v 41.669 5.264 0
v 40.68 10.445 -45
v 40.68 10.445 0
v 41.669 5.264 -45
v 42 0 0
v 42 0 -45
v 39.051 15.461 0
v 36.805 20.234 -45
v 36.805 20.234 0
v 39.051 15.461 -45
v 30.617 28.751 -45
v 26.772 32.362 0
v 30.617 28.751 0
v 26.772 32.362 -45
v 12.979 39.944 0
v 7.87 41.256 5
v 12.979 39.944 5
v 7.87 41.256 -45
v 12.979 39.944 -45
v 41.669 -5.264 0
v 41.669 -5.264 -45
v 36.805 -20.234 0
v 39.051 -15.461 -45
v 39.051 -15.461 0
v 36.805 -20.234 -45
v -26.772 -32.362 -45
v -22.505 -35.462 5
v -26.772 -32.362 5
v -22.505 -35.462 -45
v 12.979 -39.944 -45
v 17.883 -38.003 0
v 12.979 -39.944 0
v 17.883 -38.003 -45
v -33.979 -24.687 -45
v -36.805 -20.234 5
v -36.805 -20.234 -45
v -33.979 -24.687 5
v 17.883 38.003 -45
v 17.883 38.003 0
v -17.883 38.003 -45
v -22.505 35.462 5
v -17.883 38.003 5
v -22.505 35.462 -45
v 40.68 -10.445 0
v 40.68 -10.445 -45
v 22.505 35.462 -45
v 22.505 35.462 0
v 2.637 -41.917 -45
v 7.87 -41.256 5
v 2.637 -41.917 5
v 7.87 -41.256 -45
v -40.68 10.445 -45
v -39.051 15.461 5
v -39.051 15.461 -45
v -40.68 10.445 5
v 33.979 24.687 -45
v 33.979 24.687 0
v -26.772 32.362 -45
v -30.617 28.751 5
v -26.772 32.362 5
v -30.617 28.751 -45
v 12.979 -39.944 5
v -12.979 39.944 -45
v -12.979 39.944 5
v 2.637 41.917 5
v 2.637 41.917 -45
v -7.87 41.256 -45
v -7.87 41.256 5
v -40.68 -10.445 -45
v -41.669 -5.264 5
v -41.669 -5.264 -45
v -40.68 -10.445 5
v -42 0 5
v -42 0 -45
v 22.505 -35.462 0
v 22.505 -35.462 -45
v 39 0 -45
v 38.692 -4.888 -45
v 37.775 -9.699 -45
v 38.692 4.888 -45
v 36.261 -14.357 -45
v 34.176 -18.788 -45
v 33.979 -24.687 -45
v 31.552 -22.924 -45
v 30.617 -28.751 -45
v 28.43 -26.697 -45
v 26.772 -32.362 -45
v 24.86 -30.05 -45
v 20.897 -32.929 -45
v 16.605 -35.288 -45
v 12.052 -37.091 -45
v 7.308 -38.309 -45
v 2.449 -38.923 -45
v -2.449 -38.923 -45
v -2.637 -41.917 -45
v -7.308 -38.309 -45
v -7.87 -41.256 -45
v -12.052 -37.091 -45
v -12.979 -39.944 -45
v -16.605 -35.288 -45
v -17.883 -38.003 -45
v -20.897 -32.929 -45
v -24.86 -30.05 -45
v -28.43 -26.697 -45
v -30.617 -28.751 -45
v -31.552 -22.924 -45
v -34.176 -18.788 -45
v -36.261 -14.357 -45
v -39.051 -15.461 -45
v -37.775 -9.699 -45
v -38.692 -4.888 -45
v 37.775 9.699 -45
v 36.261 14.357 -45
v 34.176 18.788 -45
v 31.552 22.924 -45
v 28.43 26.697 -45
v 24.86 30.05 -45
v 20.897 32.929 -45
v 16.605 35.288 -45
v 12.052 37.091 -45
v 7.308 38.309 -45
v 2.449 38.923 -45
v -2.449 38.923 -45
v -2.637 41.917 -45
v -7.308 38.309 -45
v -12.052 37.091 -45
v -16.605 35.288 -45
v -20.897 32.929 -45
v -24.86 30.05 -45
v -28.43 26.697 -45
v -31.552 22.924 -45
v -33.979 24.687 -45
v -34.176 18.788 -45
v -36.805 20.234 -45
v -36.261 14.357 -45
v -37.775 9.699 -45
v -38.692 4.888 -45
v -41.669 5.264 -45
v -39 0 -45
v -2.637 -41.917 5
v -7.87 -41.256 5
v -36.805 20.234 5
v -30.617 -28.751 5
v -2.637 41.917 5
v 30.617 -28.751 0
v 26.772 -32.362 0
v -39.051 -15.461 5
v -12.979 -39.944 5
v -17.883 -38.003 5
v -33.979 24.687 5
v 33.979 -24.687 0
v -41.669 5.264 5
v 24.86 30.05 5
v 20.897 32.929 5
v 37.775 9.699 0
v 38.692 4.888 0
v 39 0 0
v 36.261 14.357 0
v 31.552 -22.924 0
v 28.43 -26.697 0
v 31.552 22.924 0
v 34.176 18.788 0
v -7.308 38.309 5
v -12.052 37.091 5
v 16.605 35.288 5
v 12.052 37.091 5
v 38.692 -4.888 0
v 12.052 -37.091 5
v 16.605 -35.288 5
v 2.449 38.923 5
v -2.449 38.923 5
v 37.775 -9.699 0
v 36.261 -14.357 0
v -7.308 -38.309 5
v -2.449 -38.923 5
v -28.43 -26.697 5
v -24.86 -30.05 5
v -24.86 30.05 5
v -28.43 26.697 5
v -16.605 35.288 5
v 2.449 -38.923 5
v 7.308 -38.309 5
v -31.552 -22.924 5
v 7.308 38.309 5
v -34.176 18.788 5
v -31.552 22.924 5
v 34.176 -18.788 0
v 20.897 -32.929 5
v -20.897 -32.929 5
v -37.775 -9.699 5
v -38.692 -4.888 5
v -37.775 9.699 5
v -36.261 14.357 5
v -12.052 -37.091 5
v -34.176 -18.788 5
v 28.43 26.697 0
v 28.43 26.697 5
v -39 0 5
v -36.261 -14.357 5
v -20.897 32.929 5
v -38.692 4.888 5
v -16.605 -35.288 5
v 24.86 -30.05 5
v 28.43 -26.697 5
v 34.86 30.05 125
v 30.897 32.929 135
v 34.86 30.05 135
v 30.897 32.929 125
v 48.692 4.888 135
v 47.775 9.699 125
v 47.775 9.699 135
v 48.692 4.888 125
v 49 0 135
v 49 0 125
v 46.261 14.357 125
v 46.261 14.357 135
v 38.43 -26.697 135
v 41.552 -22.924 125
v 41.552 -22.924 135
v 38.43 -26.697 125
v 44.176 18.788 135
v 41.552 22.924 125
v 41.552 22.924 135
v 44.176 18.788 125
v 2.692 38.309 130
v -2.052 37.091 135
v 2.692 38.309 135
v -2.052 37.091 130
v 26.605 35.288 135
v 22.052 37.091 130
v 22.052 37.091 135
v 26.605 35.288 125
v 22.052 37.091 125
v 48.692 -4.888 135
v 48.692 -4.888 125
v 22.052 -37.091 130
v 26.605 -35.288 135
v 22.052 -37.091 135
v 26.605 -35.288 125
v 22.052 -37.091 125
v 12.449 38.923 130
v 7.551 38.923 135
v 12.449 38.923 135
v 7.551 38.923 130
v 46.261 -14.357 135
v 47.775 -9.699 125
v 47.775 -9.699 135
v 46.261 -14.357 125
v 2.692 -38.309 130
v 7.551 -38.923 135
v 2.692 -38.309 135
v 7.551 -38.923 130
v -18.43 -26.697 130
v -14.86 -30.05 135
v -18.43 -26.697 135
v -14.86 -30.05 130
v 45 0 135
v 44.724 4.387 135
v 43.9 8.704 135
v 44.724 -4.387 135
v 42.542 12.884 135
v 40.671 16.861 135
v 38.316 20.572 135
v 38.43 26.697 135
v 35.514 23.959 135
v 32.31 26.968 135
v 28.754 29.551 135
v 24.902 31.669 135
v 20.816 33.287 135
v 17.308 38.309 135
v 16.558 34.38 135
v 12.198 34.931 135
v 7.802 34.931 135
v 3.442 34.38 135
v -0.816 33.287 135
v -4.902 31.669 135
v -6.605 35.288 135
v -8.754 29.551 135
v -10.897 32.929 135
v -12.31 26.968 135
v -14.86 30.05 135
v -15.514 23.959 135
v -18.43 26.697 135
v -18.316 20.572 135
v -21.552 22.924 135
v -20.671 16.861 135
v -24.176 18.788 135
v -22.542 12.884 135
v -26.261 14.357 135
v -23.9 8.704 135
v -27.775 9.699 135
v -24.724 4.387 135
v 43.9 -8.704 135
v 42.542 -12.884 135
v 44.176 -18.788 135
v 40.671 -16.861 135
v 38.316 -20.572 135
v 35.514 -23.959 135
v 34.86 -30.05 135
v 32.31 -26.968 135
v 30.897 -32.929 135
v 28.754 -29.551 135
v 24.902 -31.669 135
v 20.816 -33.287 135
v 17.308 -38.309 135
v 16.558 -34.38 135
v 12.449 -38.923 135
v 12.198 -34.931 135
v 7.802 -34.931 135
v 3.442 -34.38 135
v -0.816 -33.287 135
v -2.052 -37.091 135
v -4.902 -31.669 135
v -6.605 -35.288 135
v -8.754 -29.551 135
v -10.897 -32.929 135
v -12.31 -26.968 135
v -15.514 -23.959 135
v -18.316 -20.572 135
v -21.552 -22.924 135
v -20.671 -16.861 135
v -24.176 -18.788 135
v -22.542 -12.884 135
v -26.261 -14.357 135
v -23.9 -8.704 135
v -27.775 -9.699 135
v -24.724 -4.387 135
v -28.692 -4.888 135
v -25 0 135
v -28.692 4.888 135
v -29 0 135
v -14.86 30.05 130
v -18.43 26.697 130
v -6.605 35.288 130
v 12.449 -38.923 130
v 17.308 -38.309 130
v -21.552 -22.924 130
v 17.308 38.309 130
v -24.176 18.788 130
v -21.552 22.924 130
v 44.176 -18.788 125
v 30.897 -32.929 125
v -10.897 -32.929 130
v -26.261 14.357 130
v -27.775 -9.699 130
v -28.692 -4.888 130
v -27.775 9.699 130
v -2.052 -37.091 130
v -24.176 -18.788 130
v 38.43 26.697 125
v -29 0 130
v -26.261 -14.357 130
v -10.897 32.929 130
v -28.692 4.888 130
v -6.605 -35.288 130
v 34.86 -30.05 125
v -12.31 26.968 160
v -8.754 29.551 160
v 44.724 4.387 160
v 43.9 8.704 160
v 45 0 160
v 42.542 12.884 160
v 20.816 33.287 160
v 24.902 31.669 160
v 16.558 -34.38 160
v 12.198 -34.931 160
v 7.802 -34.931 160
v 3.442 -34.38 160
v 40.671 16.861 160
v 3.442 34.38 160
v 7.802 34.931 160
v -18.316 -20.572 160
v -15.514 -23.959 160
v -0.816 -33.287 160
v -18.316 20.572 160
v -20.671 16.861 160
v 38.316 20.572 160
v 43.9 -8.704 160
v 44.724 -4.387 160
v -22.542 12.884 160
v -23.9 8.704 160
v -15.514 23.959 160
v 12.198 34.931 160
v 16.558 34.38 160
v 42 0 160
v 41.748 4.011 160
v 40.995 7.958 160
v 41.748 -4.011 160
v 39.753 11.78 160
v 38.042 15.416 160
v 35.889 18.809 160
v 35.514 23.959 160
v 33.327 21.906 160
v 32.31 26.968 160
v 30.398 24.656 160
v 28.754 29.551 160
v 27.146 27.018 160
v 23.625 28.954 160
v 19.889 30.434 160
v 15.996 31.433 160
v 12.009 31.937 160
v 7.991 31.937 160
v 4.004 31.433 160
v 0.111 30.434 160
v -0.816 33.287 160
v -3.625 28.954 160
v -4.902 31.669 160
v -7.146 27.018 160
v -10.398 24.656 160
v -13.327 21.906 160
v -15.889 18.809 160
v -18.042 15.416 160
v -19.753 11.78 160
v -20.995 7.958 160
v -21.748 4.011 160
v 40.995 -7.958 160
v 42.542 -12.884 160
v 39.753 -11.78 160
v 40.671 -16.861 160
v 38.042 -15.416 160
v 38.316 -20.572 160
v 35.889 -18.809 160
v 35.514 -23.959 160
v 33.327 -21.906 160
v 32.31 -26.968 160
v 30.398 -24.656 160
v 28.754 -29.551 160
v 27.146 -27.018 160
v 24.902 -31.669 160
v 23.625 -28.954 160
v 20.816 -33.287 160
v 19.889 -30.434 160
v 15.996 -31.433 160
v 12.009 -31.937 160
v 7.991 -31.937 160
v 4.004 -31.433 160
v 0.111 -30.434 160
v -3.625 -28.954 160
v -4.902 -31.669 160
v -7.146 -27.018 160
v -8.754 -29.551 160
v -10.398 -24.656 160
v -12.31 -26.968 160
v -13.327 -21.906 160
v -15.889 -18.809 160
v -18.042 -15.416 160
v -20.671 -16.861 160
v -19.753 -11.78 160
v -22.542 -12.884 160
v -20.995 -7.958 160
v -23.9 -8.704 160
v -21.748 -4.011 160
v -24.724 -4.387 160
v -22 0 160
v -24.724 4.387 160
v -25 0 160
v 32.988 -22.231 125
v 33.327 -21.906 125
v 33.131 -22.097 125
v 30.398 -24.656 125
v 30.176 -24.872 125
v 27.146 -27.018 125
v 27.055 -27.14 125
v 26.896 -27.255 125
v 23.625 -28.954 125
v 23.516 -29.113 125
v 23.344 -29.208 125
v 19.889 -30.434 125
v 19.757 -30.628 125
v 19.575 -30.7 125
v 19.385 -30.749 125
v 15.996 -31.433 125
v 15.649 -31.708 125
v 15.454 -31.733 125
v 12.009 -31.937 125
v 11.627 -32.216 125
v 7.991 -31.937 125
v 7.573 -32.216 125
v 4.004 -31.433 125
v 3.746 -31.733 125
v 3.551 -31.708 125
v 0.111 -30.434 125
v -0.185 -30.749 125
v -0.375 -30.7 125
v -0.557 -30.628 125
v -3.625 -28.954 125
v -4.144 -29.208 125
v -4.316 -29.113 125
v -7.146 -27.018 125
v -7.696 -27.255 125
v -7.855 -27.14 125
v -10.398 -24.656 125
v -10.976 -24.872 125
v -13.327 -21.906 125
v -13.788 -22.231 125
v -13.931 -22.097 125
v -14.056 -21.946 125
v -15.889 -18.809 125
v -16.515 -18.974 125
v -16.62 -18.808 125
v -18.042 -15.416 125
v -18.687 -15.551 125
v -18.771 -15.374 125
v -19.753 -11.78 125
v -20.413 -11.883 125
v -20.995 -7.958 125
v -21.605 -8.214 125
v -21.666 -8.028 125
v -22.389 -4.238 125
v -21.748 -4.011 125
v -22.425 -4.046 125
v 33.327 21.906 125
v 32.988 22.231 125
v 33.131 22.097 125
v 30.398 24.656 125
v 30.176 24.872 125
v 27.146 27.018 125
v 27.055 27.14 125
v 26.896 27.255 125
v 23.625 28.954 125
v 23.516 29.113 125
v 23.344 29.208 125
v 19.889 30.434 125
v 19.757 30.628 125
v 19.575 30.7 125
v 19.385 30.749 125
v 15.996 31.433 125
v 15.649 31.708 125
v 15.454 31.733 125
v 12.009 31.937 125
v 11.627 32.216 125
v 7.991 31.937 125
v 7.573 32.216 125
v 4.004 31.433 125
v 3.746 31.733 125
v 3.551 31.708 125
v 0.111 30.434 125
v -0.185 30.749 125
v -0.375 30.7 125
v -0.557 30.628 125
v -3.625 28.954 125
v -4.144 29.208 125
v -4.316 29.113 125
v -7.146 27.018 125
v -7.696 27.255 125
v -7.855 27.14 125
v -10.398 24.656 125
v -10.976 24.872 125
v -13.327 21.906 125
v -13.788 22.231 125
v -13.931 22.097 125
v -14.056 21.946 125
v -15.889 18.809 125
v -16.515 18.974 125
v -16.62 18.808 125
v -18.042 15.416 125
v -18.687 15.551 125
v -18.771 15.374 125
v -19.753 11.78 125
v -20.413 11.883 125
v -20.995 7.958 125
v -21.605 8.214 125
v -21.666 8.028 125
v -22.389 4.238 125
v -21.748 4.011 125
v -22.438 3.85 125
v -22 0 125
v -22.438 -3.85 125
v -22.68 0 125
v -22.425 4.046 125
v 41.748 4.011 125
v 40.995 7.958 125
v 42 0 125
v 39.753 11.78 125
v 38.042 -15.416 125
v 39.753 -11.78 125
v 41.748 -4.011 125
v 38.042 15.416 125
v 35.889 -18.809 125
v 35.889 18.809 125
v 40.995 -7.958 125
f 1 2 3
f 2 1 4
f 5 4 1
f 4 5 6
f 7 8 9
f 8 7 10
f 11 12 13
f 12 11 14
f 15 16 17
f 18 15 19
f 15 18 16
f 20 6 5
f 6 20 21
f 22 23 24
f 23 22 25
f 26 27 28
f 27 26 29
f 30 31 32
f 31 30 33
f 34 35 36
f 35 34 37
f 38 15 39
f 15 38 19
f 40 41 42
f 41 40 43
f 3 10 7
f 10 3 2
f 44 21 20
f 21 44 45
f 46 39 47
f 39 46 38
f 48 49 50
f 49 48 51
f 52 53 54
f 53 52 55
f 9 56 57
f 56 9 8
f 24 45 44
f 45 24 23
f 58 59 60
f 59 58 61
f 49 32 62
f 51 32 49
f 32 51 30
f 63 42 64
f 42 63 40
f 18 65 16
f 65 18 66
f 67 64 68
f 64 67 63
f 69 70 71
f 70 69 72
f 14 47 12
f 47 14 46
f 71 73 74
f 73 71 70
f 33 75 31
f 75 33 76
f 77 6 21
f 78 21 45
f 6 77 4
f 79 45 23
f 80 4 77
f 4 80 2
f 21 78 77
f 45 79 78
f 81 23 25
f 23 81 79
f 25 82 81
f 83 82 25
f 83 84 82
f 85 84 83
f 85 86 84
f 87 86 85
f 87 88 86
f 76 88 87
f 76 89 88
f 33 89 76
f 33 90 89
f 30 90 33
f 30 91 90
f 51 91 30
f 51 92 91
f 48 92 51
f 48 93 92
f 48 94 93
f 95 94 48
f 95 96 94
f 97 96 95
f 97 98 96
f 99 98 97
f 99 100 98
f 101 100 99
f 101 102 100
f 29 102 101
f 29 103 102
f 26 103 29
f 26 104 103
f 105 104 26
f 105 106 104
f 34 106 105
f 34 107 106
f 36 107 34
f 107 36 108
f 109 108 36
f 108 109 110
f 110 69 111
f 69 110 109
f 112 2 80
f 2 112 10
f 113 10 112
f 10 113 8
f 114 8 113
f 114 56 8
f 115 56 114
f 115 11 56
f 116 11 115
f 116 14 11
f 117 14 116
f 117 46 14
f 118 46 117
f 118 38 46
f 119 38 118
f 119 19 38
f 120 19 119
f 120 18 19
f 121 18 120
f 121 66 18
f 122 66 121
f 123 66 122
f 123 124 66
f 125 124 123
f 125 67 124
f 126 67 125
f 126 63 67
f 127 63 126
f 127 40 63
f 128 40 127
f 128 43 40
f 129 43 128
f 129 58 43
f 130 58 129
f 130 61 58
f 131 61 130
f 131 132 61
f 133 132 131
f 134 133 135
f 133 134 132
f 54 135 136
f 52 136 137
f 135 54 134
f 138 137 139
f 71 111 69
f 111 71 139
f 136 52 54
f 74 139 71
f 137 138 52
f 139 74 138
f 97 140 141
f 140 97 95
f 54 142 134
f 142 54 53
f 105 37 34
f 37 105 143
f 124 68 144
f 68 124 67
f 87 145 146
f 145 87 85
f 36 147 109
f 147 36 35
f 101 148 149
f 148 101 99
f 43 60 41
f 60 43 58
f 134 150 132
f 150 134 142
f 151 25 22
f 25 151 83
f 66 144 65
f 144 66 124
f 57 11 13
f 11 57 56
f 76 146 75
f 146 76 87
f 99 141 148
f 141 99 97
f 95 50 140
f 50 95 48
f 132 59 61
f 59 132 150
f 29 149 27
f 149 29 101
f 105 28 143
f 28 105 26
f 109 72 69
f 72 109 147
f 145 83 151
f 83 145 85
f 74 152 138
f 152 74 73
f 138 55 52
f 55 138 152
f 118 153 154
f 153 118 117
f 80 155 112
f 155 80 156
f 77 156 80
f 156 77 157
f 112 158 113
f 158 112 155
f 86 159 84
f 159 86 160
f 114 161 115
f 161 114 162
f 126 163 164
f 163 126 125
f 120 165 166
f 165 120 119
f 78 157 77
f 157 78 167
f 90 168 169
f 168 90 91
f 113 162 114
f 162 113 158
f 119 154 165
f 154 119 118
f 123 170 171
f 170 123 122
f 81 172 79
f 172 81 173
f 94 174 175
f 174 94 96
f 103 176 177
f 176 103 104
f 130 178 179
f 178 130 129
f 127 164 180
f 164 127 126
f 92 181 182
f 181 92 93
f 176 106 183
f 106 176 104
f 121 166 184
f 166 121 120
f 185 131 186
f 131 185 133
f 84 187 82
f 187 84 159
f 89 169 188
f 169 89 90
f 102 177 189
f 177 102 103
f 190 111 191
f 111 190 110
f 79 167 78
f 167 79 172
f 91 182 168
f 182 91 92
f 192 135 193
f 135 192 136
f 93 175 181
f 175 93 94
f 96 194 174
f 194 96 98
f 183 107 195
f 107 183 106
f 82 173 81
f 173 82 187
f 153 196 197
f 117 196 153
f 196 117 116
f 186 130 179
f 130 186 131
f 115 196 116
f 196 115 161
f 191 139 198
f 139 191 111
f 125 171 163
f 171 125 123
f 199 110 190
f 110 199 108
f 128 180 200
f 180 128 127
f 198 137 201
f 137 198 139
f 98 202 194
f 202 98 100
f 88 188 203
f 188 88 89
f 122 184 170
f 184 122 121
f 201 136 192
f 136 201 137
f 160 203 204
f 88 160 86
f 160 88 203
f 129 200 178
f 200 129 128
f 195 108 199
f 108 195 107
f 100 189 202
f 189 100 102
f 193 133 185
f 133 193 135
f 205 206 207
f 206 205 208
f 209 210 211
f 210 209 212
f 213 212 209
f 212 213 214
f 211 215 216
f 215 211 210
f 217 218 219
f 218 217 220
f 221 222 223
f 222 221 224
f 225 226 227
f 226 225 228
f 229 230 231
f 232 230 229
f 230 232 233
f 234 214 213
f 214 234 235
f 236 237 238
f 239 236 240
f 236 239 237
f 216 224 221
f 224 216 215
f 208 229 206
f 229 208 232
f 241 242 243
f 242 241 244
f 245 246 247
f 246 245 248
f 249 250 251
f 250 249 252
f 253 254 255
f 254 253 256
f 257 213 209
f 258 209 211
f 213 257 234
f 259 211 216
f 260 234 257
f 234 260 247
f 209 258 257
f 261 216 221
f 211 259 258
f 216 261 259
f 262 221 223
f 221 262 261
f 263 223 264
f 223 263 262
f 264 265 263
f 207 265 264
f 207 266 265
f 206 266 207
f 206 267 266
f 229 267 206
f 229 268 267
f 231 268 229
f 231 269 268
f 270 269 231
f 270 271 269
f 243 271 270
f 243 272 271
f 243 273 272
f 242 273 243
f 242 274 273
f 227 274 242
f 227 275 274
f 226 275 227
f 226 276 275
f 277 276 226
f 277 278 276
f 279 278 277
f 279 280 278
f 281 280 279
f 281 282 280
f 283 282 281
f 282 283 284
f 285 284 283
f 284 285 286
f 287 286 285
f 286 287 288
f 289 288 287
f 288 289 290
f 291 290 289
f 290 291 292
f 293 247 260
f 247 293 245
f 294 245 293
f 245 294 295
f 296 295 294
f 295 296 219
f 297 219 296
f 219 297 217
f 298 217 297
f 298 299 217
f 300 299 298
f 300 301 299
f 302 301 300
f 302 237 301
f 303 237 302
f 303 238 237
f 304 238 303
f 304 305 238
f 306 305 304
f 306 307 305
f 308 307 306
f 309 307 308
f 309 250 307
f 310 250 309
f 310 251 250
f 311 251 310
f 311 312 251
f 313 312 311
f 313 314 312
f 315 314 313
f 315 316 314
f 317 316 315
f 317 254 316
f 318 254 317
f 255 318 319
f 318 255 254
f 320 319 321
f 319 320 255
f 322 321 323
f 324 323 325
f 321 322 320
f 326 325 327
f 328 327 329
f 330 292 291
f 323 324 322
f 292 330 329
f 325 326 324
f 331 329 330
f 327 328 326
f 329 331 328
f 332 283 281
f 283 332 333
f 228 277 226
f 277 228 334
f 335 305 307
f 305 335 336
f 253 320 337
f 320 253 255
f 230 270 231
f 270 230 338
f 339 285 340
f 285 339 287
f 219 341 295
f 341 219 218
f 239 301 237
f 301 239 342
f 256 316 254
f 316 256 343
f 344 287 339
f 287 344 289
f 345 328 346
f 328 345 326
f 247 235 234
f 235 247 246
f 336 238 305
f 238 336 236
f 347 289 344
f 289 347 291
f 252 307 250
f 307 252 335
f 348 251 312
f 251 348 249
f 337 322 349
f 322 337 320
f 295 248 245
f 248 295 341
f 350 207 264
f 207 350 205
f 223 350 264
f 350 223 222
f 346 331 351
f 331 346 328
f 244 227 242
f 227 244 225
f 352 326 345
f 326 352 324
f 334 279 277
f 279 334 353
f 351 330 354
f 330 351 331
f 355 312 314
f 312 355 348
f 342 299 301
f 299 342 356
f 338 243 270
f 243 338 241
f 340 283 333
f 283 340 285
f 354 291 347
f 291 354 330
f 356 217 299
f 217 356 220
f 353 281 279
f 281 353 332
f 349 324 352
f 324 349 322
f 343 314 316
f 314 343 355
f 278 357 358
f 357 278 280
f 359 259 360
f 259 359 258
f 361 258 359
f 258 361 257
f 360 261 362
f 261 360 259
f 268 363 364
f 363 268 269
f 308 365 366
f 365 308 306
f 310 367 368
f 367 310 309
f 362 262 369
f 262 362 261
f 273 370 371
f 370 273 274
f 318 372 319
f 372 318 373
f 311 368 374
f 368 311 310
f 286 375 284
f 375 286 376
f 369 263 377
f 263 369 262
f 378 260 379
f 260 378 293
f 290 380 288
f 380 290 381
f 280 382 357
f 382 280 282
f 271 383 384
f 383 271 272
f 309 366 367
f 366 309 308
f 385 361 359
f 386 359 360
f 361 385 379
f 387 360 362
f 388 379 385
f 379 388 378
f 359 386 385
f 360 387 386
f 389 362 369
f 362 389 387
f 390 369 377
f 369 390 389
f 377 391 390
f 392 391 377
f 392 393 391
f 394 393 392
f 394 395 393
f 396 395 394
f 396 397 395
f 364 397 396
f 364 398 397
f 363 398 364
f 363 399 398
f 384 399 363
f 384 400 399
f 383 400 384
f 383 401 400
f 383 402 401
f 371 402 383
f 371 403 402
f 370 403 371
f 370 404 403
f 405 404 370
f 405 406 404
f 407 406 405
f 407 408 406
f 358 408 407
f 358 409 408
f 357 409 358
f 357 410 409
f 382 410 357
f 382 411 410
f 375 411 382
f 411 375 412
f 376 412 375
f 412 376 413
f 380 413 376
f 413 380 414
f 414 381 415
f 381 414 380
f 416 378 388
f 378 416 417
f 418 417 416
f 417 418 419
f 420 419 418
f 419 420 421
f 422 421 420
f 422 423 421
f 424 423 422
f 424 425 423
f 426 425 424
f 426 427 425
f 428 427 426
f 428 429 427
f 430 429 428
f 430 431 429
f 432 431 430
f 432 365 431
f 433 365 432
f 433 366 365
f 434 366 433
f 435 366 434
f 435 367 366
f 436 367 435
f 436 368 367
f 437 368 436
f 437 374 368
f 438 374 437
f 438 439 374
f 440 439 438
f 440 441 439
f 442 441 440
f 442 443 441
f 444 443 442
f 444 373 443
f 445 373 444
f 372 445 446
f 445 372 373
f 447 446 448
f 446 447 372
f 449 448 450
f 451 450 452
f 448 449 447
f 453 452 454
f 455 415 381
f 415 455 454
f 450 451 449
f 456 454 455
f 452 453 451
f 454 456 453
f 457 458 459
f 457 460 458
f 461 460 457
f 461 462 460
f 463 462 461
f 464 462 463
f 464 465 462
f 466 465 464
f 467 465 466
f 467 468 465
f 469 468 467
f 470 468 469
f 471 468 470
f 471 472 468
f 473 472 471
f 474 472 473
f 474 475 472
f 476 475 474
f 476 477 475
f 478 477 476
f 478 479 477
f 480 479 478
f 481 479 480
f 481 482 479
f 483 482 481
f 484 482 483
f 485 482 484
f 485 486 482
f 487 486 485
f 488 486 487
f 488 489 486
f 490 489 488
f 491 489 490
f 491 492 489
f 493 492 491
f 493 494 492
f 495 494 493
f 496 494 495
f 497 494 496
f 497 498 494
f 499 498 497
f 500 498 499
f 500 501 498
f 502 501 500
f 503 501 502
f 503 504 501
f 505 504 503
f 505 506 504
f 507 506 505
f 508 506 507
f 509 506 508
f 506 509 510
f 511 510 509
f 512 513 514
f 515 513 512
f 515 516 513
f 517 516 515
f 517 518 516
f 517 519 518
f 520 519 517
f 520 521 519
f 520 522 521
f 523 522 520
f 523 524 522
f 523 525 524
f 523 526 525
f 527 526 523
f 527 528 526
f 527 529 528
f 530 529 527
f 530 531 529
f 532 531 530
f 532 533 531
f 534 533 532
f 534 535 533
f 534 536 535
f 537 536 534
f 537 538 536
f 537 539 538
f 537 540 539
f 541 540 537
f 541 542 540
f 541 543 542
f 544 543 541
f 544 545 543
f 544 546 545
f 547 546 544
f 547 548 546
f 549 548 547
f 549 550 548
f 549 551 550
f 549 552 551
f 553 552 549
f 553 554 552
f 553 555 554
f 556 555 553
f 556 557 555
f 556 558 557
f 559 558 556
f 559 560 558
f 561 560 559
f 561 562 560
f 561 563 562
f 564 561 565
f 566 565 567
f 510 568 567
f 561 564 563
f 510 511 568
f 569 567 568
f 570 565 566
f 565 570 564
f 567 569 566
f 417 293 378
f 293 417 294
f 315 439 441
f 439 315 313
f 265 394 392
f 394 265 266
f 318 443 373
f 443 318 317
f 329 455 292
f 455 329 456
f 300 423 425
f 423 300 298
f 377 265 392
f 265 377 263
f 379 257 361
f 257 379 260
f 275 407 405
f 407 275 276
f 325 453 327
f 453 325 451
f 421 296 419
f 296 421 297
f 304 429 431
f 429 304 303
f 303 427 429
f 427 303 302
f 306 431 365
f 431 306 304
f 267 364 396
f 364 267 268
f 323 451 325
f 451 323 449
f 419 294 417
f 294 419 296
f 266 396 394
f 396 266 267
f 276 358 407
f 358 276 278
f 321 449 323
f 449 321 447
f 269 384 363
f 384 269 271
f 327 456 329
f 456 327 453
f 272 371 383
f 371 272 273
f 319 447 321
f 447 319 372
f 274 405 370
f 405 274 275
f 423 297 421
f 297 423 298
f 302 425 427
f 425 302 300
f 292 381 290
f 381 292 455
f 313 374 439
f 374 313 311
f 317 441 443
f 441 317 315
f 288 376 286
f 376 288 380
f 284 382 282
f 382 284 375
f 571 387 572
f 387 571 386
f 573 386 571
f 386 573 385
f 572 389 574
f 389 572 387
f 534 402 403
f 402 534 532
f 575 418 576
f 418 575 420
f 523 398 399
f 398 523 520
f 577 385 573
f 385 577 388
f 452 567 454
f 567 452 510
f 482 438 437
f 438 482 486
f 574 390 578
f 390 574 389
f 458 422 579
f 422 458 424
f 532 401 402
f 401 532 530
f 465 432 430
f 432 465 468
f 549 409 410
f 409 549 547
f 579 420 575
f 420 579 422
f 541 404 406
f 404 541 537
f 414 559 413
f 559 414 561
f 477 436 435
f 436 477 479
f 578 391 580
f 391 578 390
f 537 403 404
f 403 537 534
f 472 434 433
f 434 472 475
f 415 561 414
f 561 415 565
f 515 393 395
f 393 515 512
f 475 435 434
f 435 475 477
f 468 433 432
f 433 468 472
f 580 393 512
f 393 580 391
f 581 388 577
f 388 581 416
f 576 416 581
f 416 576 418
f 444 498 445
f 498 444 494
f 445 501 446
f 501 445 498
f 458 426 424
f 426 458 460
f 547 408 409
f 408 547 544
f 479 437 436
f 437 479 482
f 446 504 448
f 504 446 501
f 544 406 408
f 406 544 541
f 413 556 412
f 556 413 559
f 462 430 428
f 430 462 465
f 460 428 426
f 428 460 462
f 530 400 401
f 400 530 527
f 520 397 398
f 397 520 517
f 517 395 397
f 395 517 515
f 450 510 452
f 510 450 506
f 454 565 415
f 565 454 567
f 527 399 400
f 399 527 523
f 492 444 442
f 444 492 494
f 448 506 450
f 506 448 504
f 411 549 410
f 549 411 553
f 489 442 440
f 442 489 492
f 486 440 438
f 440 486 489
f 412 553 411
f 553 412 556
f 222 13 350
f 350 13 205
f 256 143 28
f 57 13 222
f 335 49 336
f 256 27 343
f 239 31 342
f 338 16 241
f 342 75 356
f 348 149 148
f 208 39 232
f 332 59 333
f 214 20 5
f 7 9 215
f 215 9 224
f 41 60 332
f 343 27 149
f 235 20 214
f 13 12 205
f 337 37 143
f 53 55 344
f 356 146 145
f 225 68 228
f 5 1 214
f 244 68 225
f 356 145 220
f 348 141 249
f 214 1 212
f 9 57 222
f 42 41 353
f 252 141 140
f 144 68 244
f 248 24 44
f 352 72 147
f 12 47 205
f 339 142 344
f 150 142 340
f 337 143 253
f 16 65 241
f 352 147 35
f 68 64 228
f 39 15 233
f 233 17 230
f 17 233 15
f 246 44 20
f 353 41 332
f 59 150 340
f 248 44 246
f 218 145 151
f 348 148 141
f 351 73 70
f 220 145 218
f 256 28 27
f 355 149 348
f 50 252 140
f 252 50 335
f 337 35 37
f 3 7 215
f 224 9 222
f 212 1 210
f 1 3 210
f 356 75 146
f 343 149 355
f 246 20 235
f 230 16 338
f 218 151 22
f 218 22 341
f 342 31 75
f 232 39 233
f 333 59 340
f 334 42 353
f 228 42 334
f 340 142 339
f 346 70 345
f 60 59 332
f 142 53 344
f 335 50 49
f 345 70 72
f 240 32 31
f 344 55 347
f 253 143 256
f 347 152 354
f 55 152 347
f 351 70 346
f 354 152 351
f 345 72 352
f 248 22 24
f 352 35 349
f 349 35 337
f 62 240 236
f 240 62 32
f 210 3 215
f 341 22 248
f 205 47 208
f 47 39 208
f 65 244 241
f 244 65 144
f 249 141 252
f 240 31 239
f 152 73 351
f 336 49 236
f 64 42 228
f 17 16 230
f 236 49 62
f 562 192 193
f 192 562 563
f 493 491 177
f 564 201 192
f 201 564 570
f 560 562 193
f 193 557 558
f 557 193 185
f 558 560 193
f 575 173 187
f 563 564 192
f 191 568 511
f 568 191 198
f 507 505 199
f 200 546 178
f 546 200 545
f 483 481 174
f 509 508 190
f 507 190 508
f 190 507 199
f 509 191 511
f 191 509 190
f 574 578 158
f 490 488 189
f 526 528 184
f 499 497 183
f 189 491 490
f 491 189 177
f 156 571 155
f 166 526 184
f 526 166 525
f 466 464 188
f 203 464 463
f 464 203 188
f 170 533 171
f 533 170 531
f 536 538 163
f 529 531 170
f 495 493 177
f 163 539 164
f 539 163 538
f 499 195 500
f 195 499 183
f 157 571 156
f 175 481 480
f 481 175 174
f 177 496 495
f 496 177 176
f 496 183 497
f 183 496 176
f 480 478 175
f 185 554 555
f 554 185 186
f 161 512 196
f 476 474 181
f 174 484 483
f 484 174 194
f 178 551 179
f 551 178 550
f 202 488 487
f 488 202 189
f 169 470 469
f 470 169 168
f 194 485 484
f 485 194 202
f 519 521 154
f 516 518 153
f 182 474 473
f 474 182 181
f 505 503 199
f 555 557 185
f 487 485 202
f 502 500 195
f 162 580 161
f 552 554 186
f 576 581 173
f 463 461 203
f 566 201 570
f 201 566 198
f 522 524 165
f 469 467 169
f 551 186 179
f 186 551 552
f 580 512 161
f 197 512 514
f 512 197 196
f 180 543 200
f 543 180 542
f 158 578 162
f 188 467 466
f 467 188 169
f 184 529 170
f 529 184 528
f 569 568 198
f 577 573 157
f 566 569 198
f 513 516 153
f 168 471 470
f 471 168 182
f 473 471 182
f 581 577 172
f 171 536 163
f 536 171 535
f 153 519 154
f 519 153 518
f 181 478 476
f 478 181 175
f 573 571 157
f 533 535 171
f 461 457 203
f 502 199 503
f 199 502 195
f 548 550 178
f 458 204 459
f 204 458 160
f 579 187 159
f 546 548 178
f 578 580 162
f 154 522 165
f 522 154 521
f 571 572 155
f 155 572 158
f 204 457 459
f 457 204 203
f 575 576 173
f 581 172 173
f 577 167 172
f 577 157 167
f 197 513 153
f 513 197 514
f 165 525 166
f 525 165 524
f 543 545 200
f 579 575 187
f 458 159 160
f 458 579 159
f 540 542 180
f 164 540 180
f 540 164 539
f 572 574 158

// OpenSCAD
// pipe
// **************************

top_dia      = 78;
top=45;
mid_dia = 73;
mid=125;
bot_dia  = 70;
bot=35;
bot_offset=10;
ring=4;
wall = 3;   
$fn=50;

 //top
       difference () {
       
       translate ([0,0,-top]) cylinder(h=top,r=top_dia/2+wall);
       translate ([0,0,-top]) cylinder(h=top,r=top_dia/2);
       }
 
 //bot
       difference () {
       
       union () {
       translate ([bot_offset,0,mid+5]) cylinder(h=5,r=bot_dia/2+ring); //ring
       translate ([bot_offset,0,mid]) cylinder(h=bot,r=bot_dia/2);
       }
       translate ([bot_offset,0,mid]) cylinder(h=bot,r=bot_dia/2-wall);
       }
 
 
 //middle

       difference () {
       
       hull () {
       translate ([0,0,0]) cylinder(h=5,r=top_dia/2+wall);
       translate ([bot_offset,0,mid]) cylinder(h=5,r=bot_dia/2+ring);
       }
       
       hull (){
       translate ([0,0,0]) cylinder(h=5,r=top_dia/2);
       translate ([bot_offset,0,mid]) cylinder(h=5,r=bot_dia/2-wall);
       }
       }
       
       
       difference () {
       }
   
   

   
